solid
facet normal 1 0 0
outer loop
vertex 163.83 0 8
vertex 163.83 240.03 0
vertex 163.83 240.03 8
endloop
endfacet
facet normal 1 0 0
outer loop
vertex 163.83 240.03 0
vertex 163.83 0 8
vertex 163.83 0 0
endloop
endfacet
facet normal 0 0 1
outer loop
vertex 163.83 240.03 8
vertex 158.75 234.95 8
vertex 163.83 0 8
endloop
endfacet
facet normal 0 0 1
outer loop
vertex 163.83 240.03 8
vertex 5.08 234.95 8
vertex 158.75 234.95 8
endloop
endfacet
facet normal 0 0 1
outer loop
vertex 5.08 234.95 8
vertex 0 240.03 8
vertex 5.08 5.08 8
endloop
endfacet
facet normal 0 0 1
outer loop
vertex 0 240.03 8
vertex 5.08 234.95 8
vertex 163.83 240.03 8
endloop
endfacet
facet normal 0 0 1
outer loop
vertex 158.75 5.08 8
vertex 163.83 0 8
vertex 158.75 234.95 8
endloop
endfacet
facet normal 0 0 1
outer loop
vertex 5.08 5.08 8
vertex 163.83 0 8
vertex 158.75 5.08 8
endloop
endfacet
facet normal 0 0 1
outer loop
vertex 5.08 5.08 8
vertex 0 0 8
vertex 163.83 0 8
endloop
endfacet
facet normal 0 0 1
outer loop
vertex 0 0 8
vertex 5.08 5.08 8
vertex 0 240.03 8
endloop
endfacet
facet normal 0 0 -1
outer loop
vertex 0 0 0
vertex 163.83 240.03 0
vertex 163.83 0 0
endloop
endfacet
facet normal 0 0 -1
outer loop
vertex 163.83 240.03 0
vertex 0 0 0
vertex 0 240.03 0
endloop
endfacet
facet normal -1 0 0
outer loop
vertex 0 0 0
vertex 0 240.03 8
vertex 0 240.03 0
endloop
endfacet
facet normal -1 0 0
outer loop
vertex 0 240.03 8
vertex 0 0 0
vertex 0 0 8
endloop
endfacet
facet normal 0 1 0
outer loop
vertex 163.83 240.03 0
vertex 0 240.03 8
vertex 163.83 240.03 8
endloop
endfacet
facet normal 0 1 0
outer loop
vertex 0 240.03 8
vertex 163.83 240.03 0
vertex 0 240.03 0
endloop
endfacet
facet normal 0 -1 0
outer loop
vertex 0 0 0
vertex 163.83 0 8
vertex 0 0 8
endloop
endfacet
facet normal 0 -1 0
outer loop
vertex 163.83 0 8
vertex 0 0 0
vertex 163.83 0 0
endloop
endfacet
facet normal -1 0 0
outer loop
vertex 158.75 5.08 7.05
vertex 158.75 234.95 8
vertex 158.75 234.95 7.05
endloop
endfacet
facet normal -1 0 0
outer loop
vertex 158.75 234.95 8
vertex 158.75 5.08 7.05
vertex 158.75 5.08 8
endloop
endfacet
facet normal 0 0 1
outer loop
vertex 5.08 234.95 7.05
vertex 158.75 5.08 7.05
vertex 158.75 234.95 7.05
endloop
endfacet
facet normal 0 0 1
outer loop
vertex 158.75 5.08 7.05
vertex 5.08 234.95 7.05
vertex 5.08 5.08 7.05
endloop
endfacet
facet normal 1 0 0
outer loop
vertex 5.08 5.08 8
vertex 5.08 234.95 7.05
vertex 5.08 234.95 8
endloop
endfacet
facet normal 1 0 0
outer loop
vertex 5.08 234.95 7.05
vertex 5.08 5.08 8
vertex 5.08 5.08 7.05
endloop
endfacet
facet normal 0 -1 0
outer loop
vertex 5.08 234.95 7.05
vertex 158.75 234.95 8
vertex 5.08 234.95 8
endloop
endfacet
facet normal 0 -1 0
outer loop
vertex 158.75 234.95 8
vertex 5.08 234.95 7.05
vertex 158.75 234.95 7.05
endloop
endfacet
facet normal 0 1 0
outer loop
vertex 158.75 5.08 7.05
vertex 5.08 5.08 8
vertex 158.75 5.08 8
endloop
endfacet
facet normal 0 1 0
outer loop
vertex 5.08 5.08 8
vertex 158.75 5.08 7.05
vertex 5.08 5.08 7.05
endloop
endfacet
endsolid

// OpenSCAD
inch = 25.4;

picture_x = 6.05 * inch;
picture_y = 9.05 * inch;
picture_z = .95;

wall_thickness = .2 * inch;

frame_x = picture_x + (wall_thickness * 2);
frame_y = picture_y + (wall_thickness * 2);
frame_z = 8;

difference() {
    cube([frame_x, frame_y, frame_z]);
    translate([wall_thickness, wall_thickness, (frame_z - picture_z)]) {
        cube([picture_x, picture_y, picture_z]);
    }
}     
